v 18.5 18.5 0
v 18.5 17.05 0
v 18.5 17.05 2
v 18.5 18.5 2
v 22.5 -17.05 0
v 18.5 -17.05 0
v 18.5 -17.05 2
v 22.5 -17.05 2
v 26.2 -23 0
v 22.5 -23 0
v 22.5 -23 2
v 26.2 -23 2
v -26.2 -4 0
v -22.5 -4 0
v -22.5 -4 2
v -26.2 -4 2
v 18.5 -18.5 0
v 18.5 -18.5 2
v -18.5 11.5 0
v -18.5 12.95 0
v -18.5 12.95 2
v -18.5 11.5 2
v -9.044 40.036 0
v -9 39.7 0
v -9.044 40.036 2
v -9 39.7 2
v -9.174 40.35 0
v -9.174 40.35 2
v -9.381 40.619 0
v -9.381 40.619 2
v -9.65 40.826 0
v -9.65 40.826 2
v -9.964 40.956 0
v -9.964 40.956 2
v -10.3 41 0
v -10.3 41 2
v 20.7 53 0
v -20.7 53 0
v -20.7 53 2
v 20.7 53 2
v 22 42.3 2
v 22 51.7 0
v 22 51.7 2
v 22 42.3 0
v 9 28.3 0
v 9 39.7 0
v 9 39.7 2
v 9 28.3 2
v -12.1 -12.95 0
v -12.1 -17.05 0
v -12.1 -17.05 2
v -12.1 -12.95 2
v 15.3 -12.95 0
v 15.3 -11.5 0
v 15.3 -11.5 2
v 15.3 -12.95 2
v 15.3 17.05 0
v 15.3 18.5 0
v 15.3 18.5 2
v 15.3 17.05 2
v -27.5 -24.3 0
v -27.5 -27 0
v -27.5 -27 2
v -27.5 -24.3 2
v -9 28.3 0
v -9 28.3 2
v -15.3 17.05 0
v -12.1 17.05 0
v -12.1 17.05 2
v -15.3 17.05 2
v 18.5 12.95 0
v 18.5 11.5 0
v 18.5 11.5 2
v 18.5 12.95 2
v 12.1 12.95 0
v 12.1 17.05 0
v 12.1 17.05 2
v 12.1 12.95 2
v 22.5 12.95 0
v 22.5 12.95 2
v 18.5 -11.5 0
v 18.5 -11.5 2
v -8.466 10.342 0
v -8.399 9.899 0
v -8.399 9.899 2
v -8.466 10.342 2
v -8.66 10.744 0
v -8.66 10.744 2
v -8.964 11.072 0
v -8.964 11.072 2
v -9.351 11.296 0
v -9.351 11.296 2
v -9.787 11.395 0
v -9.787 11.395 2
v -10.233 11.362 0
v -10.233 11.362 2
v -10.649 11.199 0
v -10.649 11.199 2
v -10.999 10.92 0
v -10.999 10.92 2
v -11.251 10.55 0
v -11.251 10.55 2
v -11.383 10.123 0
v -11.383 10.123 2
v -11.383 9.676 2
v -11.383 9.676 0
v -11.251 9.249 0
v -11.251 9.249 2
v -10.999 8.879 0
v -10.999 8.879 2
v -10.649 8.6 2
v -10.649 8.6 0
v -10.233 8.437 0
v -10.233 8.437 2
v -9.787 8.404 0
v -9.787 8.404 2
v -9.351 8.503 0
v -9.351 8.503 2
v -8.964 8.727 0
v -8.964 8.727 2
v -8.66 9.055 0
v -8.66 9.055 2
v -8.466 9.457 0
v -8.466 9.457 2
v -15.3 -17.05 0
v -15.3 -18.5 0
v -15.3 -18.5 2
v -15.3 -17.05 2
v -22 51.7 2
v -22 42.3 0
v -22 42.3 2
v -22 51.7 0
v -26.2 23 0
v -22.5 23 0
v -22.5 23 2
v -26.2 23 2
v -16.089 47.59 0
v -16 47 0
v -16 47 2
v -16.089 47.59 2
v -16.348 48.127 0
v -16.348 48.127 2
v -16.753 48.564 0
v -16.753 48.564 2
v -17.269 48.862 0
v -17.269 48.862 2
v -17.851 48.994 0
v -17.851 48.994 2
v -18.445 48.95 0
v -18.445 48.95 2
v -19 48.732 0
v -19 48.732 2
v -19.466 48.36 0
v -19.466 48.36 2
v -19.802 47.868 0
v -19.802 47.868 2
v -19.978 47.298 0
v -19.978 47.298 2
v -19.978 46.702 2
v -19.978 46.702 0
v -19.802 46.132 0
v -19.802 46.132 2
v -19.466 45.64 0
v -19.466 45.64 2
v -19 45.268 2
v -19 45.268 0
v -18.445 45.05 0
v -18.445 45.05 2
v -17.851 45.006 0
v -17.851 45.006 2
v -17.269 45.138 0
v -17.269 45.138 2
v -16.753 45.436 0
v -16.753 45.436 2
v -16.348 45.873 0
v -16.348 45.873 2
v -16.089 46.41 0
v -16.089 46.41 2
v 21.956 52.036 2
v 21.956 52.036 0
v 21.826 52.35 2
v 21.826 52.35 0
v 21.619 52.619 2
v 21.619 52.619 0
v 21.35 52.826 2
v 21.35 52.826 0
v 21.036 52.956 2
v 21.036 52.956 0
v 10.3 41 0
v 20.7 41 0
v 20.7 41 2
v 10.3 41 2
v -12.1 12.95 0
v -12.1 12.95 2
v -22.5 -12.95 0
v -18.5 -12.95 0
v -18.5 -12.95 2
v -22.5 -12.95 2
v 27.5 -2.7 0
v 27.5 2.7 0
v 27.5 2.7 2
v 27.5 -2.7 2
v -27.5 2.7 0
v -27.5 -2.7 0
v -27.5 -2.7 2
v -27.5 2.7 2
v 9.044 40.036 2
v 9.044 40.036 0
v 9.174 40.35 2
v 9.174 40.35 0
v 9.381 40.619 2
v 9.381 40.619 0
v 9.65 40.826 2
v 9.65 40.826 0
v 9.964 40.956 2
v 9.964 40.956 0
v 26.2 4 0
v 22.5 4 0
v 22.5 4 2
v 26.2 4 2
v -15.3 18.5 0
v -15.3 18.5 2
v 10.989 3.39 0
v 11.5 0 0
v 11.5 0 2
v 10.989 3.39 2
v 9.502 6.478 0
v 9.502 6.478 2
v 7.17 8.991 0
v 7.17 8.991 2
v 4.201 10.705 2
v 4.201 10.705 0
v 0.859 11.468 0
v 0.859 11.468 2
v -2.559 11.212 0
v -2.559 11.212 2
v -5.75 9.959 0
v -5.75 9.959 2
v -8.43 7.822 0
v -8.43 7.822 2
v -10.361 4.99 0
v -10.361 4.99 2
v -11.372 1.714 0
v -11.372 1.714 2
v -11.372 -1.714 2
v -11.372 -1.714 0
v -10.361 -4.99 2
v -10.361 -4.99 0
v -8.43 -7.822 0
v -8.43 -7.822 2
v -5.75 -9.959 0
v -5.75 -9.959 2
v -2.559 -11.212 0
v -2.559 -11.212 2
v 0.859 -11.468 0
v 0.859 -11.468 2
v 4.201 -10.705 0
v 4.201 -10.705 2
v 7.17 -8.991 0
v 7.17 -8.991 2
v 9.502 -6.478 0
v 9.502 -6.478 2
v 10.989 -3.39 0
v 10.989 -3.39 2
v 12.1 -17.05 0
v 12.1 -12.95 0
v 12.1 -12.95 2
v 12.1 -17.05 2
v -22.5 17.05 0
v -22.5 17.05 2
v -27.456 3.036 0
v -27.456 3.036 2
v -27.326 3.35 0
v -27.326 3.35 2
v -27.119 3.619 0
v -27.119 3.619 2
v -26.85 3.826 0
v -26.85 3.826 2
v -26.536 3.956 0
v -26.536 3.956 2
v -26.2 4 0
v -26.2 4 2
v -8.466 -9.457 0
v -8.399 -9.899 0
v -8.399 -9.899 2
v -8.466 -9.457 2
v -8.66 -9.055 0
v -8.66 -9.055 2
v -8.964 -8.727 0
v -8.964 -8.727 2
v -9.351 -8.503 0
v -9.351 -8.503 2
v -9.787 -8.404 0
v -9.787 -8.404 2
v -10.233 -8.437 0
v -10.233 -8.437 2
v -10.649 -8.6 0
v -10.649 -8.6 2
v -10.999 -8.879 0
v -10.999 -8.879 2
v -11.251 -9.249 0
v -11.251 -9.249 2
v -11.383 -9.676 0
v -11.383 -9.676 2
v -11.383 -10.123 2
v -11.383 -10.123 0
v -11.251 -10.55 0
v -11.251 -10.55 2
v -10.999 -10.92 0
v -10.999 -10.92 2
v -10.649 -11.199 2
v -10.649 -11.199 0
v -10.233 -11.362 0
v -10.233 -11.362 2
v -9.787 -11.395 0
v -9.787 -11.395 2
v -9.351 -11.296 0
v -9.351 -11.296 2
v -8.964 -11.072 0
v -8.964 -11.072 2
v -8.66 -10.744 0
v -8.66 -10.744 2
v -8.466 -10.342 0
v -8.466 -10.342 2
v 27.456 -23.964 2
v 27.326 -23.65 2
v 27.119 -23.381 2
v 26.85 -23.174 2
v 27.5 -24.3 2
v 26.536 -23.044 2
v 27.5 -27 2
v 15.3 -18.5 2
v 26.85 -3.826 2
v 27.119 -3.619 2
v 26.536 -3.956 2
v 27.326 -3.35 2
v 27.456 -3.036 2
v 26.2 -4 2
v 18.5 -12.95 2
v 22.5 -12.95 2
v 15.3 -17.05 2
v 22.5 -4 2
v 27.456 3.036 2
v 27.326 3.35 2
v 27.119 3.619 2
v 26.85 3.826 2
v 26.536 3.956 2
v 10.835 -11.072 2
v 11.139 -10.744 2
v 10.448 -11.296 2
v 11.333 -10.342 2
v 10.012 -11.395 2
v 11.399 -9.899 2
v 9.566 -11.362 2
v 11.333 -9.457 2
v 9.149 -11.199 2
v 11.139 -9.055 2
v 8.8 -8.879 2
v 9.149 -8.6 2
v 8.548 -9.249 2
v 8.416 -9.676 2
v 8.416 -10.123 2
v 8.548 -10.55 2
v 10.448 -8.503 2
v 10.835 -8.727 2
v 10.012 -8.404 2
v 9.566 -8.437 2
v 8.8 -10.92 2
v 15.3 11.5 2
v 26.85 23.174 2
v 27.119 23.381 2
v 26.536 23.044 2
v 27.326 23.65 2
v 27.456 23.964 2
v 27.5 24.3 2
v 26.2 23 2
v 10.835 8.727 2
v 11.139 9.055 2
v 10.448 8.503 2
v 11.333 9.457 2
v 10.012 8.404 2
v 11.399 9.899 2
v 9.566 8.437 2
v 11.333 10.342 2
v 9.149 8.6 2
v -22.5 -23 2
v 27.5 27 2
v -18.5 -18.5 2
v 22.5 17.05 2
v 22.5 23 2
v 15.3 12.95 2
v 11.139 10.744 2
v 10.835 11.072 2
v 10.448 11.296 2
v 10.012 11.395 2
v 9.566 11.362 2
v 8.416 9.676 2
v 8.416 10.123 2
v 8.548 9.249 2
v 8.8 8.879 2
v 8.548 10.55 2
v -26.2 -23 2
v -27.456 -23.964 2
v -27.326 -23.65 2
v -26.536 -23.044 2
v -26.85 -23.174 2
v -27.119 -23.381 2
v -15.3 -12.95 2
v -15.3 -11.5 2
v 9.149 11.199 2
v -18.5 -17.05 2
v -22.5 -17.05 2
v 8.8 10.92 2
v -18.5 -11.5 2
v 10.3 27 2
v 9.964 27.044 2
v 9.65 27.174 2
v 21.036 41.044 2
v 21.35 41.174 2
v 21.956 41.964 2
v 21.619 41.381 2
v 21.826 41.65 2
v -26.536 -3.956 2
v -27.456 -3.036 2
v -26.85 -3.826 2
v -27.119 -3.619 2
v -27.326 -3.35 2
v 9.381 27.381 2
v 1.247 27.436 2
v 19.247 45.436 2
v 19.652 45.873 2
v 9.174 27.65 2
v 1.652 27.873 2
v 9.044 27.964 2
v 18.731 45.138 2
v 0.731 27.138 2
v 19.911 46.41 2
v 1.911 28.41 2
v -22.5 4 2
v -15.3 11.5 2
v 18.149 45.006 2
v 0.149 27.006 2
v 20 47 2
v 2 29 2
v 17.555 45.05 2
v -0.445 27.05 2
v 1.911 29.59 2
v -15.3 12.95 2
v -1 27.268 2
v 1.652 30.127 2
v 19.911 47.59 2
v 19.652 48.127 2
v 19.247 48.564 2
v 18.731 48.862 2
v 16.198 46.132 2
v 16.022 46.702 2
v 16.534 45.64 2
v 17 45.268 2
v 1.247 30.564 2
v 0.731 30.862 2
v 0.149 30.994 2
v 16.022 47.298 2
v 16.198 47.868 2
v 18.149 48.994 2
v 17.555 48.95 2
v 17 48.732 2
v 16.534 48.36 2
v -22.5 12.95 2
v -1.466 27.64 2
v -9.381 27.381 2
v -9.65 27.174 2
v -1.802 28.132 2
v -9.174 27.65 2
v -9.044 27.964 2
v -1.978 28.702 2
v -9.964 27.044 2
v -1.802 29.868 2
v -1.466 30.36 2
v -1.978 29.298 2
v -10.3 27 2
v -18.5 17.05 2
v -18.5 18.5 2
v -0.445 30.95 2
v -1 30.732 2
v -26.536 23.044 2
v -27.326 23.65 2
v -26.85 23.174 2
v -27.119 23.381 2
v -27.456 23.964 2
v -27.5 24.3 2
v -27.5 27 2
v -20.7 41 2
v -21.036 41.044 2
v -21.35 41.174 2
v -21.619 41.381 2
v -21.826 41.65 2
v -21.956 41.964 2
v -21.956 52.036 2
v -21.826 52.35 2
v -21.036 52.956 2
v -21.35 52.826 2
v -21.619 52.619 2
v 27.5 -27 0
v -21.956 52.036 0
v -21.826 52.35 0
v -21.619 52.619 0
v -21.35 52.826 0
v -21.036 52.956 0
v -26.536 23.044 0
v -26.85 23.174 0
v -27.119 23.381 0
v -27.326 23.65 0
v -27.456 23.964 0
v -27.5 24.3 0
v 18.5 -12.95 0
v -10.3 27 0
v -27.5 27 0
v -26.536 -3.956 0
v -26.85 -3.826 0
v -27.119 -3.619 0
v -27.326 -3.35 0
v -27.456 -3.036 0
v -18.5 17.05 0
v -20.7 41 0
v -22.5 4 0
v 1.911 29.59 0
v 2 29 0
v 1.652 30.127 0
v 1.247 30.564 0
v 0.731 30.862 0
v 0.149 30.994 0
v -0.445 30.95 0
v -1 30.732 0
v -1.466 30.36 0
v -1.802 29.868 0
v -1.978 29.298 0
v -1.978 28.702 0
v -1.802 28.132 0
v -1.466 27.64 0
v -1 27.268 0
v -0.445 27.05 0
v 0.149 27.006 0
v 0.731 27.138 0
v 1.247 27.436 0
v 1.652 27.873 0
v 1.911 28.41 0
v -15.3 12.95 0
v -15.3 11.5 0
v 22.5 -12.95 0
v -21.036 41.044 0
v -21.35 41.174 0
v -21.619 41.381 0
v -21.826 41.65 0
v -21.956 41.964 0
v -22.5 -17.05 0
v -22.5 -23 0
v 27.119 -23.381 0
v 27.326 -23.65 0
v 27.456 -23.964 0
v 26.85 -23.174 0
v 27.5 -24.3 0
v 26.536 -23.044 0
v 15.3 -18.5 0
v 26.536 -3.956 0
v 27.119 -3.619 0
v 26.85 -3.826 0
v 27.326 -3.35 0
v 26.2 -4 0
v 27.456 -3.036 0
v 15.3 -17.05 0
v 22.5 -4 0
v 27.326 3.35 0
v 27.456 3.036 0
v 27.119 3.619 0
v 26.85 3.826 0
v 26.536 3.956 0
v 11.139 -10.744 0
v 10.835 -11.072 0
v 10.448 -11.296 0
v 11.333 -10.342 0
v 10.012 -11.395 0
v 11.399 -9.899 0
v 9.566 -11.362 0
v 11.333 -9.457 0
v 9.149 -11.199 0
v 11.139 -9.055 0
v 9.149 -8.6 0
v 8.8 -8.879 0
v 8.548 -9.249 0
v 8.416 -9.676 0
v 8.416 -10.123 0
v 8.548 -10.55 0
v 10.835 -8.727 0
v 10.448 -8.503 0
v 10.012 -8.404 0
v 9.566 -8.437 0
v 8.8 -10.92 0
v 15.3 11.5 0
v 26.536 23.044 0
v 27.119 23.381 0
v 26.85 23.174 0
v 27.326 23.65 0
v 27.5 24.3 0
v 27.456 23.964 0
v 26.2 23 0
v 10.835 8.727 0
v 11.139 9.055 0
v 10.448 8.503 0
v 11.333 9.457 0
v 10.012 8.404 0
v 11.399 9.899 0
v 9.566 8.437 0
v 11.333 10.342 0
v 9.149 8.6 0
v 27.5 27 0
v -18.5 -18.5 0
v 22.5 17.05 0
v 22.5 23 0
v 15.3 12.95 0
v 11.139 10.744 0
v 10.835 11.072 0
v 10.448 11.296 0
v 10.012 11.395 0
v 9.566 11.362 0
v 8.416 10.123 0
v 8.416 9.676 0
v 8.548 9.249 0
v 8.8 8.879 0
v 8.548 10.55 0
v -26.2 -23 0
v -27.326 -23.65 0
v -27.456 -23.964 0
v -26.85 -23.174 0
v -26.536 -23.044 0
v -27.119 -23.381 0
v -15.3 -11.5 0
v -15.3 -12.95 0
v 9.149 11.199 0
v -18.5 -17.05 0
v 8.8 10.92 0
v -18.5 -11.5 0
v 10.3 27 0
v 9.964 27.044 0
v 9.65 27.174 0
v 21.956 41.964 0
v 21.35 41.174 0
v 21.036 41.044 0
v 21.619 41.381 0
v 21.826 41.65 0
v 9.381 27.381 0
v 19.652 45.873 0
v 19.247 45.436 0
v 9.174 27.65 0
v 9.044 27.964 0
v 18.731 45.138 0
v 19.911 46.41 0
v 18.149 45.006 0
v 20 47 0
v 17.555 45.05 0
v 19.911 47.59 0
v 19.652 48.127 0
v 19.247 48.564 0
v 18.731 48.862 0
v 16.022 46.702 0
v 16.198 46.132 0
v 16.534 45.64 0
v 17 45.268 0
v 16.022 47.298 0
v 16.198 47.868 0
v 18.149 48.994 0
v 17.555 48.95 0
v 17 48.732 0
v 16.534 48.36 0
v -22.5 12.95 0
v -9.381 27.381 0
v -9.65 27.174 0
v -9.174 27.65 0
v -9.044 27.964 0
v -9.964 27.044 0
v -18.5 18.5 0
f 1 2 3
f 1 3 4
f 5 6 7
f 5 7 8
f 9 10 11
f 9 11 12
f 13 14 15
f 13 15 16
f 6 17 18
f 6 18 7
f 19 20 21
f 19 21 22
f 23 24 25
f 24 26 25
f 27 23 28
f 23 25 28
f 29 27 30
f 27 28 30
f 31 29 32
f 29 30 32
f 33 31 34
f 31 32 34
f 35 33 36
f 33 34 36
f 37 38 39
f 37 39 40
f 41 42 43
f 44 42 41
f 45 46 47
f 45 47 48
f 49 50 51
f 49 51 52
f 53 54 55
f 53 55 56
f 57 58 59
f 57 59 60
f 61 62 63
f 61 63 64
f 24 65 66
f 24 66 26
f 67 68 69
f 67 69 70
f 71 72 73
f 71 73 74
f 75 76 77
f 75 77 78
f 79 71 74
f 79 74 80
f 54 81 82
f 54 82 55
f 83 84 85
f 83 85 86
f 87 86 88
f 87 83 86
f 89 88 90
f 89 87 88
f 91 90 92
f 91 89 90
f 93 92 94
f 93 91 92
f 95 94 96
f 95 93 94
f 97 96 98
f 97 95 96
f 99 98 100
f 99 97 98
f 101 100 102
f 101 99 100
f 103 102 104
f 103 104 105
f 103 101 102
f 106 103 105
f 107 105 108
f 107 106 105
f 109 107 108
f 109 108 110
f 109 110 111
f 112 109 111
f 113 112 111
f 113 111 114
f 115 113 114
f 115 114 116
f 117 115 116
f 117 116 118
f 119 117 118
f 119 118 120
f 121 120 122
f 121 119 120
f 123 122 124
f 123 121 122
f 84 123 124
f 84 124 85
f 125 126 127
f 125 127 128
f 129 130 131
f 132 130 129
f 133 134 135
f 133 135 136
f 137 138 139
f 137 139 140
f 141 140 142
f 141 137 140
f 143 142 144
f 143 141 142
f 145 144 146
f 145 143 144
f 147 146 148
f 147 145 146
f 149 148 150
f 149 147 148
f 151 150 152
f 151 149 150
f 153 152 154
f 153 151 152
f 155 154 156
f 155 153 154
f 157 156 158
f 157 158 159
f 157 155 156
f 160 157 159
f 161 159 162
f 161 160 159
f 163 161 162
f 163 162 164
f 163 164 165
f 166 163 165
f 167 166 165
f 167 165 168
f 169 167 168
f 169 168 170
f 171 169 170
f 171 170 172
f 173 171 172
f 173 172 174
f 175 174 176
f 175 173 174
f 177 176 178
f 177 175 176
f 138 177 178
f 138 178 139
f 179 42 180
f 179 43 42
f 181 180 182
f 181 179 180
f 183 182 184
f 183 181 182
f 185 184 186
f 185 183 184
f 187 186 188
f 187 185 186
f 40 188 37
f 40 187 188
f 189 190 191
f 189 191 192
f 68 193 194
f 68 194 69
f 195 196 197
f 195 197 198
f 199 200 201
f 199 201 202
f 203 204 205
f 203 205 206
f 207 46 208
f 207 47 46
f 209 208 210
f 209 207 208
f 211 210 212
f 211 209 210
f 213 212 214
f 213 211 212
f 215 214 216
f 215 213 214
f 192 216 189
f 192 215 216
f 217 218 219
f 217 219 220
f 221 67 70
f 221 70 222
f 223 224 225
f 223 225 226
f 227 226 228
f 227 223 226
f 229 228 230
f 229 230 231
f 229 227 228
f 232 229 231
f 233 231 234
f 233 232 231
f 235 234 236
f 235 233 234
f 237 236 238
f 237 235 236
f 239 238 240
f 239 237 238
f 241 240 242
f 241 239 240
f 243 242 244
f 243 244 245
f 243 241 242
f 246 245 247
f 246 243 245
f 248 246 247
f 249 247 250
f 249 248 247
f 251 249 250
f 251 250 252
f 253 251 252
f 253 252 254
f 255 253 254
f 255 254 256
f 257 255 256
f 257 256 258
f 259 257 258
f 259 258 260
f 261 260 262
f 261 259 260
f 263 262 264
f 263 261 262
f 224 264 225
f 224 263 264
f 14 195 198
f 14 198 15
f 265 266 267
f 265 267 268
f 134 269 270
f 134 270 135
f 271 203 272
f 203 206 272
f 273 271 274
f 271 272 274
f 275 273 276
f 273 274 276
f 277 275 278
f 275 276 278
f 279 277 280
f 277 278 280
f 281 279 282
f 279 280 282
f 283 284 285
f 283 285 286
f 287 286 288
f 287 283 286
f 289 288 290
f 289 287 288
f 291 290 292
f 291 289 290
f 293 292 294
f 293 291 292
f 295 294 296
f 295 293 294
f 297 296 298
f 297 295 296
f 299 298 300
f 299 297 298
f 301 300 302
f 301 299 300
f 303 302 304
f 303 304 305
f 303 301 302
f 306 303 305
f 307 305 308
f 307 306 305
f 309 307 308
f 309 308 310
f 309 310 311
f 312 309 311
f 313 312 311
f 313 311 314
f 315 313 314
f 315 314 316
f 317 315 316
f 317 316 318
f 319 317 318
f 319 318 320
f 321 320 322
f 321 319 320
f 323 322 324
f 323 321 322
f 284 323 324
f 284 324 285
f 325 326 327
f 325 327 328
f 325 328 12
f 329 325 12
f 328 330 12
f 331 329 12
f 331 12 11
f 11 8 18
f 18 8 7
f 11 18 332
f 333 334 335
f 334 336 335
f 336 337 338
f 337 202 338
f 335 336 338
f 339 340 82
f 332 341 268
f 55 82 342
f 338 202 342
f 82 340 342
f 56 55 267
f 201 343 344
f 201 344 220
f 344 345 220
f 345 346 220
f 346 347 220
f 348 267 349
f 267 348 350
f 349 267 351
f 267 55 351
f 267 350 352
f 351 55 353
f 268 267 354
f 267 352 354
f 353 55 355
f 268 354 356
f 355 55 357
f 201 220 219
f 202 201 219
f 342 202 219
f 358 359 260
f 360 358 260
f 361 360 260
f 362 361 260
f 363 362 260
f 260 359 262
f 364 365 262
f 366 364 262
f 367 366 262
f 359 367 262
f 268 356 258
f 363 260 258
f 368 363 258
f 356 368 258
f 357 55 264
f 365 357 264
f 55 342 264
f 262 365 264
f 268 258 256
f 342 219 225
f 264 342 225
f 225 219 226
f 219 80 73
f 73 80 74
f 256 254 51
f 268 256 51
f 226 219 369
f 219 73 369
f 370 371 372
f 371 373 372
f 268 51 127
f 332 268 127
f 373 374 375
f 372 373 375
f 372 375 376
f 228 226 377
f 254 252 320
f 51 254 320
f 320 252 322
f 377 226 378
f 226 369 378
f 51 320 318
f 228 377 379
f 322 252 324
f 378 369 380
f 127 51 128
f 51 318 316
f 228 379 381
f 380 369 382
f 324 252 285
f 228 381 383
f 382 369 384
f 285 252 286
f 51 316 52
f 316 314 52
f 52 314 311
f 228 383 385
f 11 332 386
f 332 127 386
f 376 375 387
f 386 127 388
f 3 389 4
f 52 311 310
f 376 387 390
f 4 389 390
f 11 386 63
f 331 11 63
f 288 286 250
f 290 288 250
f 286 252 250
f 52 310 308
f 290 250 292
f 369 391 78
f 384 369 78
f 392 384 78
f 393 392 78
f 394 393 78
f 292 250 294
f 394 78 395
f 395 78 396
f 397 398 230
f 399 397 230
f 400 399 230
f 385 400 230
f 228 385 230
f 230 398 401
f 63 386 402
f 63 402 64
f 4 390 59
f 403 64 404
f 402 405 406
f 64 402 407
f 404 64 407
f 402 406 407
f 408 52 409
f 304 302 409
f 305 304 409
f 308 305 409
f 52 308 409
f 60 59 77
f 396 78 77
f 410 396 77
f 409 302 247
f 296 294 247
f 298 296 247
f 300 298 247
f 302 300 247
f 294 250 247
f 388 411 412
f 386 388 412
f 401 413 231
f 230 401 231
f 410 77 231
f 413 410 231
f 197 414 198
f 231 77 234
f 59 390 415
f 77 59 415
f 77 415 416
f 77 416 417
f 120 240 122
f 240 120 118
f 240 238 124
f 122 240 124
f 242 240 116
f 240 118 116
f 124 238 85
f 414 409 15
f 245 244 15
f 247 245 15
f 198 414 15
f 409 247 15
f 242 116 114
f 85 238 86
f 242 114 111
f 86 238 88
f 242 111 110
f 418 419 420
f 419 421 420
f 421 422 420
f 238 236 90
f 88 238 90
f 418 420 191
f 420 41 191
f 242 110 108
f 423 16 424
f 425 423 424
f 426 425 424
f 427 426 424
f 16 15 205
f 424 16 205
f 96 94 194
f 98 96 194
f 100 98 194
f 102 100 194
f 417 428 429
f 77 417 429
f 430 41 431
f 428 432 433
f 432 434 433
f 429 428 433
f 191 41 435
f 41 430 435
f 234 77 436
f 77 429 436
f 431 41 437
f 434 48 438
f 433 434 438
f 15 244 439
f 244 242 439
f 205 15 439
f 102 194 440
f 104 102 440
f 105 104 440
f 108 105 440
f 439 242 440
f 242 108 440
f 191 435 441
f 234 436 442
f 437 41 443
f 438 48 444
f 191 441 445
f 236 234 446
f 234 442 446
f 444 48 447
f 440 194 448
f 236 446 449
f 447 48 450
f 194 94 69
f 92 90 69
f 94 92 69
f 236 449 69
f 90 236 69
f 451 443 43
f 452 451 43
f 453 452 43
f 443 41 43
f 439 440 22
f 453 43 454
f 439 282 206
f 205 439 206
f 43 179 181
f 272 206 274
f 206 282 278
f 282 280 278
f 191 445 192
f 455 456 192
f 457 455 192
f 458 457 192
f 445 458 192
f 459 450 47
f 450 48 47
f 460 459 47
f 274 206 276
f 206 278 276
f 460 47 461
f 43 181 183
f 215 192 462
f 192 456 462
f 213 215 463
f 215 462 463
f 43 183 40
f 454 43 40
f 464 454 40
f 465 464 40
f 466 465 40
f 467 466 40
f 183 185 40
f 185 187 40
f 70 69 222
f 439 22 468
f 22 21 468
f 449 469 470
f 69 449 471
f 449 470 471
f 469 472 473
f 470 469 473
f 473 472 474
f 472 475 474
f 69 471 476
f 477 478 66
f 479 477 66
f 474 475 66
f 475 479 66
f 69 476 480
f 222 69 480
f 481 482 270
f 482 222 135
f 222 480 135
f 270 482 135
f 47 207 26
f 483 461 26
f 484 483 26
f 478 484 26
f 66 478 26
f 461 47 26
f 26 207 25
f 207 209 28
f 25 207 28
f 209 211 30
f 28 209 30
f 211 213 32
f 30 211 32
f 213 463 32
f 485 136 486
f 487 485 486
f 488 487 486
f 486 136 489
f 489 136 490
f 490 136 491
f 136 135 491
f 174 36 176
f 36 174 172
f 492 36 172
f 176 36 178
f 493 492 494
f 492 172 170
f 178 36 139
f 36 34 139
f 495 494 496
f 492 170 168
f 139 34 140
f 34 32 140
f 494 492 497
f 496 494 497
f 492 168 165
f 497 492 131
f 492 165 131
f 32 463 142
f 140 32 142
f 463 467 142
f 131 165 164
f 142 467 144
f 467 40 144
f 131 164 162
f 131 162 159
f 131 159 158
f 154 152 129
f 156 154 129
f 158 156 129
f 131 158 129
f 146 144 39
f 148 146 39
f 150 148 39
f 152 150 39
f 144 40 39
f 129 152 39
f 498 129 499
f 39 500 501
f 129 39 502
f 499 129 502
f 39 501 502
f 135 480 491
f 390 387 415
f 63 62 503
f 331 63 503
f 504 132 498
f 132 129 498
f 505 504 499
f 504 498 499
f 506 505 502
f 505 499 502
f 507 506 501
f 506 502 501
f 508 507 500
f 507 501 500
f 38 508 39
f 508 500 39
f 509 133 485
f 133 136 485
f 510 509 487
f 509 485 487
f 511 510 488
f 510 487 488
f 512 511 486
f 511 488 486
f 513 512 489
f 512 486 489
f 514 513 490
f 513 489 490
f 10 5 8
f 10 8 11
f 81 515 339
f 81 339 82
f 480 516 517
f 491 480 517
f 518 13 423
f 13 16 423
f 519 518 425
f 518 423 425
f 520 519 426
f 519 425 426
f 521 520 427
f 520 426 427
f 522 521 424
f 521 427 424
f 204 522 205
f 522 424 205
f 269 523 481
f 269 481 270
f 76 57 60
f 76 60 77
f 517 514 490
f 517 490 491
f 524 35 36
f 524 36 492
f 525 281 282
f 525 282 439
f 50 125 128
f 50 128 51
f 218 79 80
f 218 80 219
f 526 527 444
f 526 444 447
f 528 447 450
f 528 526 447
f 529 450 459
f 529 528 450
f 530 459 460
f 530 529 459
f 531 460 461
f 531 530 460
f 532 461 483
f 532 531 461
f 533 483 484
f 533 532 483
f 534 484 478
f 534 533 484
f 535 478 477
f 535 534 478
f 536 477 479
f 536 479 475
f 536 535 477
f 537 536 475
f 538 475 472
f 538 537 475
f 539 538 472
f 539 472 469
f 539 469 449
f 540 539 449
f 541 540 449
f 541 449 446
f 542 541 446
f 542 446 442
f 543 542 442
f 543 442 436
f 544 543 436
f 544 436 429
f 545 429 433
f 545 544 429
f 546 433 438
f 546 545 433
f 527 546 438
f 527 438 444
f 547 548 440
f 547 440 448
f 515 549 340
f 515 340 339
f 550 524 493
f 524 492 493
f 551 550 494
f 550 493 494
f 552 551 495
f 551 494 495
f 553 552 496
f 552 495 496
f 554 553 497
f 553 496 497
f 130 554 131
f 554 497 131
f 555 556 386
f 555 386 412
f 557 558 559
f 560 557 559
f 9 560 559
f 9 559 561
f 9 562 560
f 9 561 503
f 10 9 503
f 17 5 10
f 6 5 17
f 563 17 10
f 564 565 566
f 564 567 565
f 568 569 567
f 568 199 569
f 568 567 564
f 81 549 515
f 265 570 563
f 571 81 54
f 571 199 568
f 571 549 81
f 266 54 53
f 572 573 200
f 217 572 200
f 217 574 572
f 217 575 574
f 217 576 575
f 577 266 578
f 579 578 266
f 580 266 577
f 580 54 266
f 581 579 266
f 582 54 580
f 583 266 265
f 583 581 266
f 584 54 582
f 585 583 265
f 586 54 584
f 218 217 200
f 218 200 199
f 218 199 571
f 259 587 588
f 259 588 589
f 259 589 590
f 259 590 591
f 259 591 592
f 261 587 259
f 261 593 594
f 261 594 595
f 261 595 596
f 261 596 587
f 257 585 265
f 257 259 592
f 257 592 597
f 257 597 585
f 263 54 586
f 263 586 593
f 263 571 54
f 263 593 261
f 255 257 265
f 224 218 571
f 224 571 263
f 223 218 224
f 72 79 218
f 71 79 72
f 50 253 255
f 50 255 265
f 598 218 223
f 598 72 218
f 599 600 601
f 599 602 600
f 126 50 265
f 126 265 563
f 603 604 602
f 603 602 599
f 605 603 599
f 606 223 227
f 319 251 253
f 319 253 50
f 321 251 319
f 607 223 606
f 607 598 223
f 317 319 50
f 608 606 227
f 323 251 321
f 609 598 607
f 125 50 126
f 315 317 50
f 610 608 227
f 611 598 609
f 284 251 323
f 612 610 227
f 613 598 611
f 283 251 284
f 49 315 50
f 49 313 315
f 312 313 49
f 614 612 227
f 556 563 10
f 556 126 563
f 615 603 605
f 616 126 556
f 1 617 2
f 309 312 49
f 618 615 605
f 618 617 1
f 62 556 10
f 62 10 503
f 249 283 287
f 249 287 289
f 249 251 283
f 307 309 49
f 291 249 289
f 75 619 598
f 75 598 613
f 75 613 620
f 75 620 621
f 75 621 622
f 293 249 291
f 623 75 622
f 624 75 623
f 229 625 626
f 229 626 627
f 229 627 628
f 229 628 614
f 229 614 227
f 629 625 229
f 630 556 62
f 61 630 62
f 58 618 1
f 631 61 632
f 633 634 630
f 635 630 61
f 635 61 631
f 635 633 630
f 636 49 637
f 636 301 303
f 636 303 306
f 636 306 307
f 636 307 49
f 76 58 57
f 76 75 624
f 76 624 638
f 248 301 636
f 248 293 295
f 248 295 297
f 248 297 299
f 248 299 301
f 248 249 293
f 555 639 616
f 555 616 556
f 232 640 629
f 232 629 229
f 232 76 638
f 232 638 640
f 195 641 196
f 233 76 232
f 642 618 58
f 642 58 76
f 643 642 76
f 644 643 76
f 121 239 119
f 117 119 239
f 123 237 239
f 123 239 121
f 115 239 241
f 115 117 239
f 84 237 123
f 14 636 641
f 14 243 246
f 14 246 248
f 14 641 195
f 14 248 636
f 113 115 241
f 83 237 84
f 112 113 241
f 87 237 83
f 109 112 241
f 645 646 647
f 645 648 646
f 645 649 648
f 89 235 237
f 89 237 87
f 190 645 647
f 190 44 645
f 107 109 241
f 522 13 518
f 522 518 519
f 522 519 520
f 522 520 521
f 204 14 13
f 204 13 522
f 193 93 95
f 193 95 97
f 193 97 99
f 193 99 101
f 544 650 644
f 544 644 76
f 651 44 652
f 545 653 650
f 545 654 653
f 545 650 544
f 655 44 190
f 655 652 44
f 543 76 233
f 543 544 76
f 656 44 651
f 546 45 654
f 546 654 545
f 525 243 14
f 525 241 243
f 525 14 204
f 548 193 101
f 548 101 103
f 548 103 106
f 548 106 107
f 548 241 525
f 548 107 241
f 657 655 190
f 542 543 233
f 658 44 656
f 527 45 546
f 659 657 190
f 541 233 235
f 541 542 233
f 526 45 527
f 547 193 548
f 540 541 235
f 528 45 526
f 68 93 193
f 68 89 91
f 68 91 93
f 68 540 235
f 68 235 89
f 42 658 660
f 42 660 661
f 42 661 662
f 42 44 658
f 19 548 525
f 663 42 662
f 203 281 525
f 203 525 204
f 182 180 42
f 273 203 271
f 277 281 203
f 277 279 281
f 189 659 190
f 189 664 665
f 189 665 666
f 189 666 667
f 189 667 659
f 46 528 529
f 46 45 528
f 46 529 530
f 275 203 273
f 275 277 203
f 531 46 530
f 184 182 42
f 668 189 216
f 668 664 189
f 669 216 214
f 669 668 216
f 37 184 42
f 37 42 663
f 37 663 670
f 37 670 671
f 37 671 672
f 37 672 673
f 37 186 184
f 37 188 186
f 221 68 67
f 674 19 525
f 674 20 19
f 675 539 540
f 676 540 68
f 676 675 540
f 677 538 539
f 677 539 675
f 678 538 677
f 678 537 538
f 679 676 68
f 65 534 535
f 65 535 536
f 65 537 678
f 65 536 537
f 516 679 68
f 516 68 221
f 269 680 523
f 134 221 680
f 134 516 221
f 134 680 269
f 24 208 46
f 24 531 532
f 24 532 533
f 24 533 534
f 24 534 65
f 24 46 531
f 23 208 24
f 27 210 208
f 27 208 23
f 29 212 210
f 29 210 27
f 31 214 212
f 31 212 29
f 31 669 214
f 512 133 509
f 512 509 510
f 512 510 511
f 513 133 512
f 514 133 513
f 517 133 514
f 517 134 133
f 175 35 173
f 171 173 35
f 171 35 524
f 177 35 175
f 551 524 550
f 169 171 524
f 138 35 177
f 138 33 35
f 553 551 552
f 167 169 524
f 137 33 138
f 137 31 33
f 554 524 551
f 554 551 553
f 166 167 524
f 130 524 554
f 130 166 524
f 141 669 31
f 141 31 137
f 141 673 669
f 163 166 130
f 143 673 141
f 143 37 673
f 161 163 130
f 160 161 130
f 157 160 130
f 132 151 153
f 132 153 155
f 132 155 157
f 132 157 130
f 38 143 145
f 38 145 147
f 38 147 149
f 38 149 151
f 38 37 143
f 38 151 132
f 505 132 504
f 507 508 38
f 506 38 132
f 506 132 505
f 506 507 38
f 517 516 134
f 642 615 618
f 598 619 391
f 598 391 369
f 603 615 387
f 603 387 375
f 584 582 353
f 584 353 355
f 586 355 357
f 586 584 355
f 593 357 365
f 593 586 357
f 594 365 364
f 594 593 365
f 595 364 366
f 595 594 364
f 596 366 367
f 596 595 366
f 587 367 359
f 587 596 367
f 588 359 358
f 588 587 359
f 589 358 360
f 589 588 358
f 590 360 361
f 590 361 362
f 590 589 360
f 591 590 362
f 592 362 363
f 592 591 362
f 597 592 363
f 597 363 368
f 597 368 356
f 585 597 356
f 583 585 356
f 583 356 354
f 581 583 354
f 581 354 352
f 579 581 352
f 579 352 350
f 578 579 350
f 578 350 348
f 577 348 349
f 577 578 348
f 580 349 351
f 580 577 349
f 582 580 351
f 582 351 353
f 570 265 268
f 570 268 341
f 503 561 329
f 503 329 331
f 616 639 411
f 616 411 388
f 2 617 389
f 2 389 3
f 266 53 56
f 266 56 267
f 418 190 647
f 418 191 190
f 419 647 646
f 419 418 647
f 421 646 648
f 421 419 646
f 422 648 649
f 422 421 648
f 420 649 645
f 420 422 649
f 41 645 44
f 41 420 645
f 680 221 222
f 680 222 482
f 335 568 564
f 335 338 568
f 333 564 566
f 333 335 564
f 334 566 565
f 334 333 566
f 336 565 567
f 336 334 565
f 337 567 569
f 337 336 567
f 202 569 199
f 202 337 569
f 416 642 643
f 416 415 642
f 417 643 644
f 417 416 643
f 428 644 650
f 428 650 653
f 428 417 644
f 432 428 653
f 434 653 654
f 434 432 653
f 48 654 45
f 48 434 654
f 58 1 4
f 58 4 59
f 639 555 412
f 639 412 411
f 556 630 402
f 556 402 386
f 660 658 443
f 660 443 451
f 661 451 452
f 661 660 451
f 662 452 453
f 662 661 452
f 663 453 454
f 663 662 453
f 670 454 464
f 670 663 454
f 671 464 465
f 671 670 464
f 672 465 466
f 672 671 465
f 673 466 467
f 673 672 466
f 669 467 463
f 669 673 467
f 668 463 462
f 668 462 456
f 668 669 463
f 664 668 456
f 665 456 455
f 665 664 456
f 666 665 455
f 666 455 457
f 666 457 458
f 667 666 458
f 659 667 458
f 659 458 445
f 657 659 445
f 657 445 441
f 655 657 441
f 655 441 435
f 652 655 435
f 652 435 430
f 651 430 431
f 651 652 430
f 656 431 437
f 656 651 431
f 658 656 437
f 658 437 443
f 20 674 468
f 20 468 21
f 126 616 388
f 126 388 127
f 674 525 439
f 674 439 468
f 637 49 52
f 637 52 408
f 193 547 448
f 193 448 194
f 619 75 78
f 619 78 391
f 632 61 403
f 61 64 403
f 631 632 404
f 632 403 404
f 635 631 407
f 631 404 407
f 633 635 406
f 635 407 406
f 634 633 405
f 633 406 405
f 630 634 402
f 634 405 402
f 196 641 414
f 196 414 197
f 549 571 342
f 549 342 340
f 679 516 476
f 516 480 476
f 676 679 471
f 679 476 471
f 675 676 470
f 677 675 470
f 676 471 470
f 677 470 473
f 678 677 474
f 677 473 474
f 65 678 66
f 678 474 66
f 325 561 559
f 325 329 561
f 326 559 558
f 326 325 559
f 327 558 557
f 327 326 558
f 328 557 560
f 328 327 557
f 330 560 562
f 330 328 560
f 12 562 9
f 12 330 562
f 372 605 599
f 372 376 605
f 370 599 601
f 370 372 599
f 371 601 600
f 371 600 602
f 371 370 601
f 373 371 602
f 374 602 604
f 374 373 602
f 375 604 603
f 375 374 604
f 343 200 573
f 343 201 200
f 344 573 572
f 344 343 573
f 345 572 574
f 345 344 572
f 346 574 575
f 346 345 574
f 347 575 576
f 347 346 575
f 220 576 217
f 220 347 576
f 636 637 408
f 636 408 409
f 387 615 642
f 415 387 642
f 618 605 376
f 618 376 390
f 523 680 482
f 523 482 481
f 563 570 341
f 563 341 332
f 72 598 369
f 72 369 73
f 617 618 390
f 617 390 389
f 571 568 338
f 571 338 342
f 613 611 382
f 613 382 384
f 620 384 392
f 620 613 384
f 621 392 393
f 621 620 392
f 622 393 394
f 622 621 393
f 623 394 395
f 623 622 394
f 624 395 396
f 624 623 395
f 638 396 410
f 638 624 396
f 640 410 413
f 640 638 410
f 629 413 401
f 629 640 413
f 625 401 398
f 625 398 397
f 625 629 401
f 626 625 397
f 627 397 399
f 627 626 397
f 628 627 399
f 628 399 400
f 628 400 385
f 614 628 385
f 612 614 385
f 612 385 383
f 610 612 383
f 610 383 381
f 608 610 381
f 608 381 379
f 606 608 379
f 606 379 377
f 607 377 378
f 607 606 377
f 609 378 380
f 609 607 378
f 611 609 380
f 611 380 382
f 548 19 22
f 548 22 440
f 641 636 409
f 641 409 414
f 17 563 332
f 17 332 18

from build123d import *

# Parameters (mm, degrees)
SKETCH_1_R      = 1.5
SKETCH_1_R_2    = 11.5
SKETCH_1_R_3    = 2
EXTRUDE_1_DEPTH = 2
FILLET_1_R      = 1.3


with BuildPart() as part:
    # 草图1 → 凸台-拉伸1 (new body)
    with BuildSketch(Plane.XY):
        Polygon((22.5, -27), (-22.5, -27), (-27.5, -27), (-27.5, -23), (-22.5, -23), (-22.5, -17.05), (-18.5, -17.05), (-18.5, -18.5), (-15.3, -18.5), (-15.3, -17.05), (-12.1, -17.05), (-12.1, -12.95), (-15.3, -12.95), (-15.3, -11.5), (-18.5, -11.5), (-18.5, -12.95), (-22.5, -12.95), (-22.5, -4), (-27.5, -4), (-27.5, 4), (-22.5, 4), (-22.5, 12.95), (-18.5, 12.95), (-18.5, 11.5), (-15.3, 11.5), (-15.3, 12.95), (-12.1, 12.95), (-12.1, 17.05), (-15.3, 17.05), (-15.3, 18.5), (-18.5, 18.5), (-18.5, 17.05), (-22.5, 17.05), (-22.5, 23), (-27.5, 23), (-27.5, 27), (-22.5, 27), (-9, 27), (-9, 41), (-22, 41), (-22, 53), (22, 53), (22, 41), (9, 41), (9, 27), (22.5, 27), (27.5, 27), (27.5, 23), (22.5, 23), (22.5, 17.05), (18.5, 17.05), (18.5, 18.5), (15.3, 18.5), (15.3, 17.05), (12.1, 17.05), (12.1, 12.95), (15.3, 12.95), (15.3, 11.5), (18.5, 11.5), (18.5, 12.95), (22.5, 12.95), (22.5, 4), (27.5, 4), (27.5, -4), (22.5, -4), (22.5, -12.95), (18.5, -12.95), (18.5, -11.5), (15.3, -11.5), (15.3, -12.95), (12.1, -12.95), (12.1, -17.05), (15.3, -17.05), (15.3, -18.5), (18.5, -18.5), (18.5, -17.05), (22.5, -17.05), (22.5, -23), (27.5, -23), (27.5, -27), align=None)
        with Locations((9.899494937, 9.899494937)):
            Circle(SKETCH_1_R, mode=Mode.SUBTRACT)
        Circle(SKETCH_1_R_2, mode=Mode.SUBTRACT)
        with Locations((9.899494937, -9.899494937)):
            Circle(SKETCH_1_R, mode=Mode.SUBTRACT)
        with Locations((-9.899494937, -9.899494937)):
            Circle(SKETCH_1_R, mode=Mode.SUBTRACT)
        with Locations((-9.899494937, 9.899494937)):
            Circle(SKETCH_1_R, mode=Mode.SUBTRACT)
        with Locations((-18, 47)):
            Circle(SKETCH_1_R_3, mode=Mode.SUBTRACT)
        with Locations((18, 47)):
            Circle(SKETCH_1_R_3, mode=Mode.SUBTRACT)
        with Locations((0, 29)):
            Circle(SKETCH_1_R_3, mode=Mode.SUBTRACT)
    extrude(amount=EXTRUDE_1_DEPTH)

    # 圆角1
    fillet_1_edges = [part.edges().sort_by_distance(p)[0] for p in [
        (-9, 27, 1),
        (-9, 41, 1),
        (-22, 41, 1),
        (-22, 53, 1),
        (22, 53, 1),
        (22, 41, 1),
        (9, 41, 1),
        (9, 27, 1),
        (27.5, 23, 1),
        (27.5, 4, 1),
        (27.5, -4, 1),
        (27.5, -23, 1),
        (-27.5, -23, 1),
        (-27.5, -4, 1),
        (-27.5, 4, 1),
        (-27.5, 23, 1),
    ]]
    fillet(fillet_1_edges, radius=FILLET_1_R)


solid = part.part
